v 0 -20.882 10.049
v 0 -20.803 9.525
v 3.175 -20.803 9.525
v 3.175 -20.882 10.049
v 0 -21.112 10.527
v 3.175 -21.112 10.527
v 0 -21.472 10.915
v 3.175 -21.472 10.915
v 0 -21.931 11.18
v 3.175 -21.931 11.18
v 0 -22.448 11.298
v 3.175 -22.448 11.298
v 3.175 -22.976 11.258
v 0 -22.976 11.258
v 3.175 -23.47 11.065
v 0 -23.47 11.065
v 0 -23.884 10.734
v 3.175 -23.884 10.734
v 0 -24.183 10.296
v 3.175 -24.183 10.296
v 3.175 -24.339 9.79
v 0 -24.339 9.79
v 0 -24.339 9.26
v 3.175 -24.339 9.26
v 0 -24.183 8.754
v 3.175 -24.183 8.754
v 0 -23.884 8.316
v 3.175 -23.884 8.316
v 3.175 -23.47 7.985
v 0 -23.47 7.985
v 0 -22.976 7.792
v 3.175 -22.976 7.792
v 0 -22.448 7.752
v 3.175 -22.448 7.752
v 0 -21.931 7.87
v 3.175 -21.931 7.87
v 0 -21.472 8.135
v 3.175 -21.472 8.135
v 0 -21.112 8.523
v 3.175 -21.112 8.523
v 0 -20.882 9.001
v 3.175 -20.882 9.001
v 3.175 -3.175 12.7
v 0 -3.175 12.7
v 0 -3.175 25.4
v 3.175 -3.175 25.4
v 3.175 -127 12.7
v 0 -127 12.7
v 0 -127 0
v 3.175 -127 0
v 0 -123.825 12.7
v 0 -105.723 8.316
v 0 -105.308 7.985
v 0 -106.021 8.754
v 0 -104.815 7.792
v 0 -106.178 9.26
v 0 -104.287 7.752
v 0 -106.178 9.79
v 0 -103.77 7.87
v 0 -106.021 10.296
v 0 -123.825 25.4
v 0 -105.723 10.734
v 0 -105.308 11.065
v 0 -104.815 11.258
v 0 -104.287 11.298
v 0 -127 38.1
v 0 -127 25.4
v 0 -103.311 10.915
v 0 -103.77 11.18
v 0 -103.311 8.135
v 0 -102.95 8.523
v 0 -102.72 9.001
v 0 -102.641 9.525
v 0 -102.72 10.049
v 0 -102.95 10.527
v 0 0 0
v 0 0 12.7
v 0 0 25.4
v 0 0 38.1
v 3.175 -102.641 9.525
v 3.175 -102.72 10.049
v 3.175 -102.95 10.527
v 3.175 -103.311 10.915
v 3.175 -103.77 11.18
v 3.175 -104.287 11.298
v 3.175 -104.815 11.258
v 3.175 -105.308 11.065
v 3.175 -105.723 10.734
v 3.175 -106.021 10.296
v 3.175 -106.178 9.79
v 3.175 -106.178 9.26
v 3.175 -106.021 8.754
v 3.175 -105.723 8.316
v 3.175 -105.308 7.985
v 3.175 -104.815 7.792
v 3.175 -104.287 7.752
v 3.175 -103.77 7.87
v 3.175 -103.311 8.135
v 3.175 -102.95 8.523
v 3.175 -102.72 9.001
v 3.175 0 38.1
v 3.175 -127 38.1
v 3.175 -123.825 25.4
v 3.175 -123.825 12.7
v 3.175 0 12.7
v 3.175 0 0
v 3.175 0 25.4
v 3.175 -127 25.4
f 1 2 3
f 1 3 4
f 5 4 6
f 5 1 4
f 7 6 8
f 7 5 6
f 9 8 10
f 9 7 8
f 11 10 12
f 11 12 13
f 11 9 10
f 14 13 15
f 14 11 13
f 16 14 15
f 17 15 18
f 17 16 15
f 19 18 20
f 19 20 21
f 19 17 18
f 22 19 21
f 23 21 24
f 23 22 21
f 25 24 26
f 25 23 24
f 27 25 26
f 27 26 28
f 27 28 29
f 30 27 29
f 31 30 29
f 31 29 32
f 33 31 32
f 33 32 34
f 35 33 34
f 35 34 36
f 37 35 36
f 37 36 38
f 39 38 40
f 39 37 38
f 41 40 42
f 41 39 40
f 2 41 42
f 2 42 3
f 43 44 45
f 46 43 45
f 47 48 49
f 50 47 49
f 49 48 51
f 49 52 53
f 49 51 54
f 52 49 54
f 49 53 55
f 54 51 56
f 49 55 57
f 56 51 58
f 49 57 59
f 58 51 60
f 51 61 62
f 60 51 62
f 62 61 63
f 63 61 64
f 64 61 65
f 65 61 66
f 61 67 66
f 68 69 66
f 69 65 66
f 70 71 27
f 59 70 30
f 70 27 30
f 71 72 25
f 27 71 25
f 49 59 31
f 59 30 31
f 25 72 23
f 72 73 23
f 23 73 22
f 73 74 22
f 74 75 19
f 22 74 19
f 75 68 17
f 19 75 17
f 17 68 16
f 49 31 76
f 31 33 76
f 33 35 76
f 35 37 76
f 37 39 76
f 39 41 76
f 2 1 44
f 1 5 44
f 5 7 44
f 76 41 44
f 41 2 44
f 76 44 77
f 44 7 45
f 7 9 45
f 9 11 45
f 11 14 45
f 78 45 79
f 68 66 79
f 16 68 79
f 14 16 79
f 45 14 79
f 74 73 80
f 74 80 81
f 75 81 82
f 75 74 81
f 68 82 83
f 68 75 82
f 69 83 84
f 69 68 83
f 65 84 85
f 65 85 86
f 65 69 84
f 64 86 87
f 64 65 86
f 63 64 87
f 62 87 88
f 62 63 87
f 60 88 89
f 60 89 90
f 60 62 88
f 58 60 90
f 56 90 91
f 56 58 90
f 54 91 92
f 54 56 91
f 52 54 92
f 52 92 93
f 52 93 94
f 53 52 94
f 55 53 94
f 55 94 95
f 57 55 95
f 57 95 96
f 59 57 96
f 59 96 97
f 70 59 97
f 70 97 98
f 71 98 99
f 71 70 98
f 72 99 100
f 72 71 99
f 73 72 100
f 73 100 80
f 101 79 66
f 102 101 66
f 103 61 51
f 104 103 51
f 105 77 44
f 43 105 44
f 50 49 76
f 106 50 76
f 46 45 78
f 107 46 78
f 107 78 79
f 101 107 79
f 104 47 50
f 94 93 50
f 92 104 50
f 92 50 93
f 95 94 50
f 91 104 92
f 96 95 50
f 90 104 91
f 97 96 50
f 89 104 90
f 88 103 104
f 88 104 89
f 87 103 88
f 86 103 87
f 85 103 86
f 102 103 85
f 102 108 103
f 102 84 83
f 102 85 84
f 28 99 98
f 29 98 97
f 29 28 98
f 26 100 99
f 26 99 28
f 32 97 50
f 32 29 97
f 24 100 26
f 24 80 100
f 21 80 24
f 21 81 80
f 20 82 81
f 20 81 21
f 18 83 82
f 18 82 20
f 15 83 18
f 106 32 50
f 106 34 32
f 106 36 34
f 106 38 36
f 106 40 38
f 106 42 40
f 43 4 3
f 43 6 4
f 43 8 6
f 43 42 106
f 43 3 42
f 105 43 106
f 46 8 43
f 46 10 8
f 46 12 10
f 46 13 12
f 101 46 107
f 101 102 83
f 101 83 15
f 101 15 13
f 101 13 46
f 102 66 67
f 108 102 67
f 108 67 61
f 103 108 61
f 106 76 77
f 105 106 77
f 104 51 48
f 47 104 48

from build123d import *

# Parameters (mm, degrees)
F0_R     = 1.778
F1_DEPTH = 3.175
F0_W     = 3.175
F0_H     = 12.7
F2_DEPTH = 25.4


with BuildPart() as f1:
    # F0 (on Right) → F1 (new body)
    with BuildSketch(Plane.YZ):
        Polygon((-63.5, 0), (0, 0), (0, 12.7), (-3.175, 12.7), (-3.175, 25.4), (0, 25.4), (0, 38.1), (-63.5, 38.1), align=None)
        with Locations((-22.5806, 9.525)):
            Circle(F0_R, mode=Mode.SUBTRACT)
        Polygon((-127, 0), (-63.5, 0), (-63.5, 38.1), (-127, 38.1), (-127, 25.4), (-123.825, 25.4), (-123.825, 12.7), (-127, 12.7), align=None)
        with Locations((-104.4194, 9.525)):
            Circle(F0_R, mode=Mode.SUBTRACT)
    extrude(amount=F1_DEPTH)

    # F0 (on Right) → F2 (cut)
    with BuildSketch(Plane.YZ):
        with Locations((-1.5875, 19.05)):
            Rectangle(F0_W, F0_H)
        with Locations((-125.4125, 19.05)):
            Rectangle(F0_W, F0_H)
    extrude(amount=-F2_DEPTH, mode=Mode.SUBTRACT)


solid = f1.part
